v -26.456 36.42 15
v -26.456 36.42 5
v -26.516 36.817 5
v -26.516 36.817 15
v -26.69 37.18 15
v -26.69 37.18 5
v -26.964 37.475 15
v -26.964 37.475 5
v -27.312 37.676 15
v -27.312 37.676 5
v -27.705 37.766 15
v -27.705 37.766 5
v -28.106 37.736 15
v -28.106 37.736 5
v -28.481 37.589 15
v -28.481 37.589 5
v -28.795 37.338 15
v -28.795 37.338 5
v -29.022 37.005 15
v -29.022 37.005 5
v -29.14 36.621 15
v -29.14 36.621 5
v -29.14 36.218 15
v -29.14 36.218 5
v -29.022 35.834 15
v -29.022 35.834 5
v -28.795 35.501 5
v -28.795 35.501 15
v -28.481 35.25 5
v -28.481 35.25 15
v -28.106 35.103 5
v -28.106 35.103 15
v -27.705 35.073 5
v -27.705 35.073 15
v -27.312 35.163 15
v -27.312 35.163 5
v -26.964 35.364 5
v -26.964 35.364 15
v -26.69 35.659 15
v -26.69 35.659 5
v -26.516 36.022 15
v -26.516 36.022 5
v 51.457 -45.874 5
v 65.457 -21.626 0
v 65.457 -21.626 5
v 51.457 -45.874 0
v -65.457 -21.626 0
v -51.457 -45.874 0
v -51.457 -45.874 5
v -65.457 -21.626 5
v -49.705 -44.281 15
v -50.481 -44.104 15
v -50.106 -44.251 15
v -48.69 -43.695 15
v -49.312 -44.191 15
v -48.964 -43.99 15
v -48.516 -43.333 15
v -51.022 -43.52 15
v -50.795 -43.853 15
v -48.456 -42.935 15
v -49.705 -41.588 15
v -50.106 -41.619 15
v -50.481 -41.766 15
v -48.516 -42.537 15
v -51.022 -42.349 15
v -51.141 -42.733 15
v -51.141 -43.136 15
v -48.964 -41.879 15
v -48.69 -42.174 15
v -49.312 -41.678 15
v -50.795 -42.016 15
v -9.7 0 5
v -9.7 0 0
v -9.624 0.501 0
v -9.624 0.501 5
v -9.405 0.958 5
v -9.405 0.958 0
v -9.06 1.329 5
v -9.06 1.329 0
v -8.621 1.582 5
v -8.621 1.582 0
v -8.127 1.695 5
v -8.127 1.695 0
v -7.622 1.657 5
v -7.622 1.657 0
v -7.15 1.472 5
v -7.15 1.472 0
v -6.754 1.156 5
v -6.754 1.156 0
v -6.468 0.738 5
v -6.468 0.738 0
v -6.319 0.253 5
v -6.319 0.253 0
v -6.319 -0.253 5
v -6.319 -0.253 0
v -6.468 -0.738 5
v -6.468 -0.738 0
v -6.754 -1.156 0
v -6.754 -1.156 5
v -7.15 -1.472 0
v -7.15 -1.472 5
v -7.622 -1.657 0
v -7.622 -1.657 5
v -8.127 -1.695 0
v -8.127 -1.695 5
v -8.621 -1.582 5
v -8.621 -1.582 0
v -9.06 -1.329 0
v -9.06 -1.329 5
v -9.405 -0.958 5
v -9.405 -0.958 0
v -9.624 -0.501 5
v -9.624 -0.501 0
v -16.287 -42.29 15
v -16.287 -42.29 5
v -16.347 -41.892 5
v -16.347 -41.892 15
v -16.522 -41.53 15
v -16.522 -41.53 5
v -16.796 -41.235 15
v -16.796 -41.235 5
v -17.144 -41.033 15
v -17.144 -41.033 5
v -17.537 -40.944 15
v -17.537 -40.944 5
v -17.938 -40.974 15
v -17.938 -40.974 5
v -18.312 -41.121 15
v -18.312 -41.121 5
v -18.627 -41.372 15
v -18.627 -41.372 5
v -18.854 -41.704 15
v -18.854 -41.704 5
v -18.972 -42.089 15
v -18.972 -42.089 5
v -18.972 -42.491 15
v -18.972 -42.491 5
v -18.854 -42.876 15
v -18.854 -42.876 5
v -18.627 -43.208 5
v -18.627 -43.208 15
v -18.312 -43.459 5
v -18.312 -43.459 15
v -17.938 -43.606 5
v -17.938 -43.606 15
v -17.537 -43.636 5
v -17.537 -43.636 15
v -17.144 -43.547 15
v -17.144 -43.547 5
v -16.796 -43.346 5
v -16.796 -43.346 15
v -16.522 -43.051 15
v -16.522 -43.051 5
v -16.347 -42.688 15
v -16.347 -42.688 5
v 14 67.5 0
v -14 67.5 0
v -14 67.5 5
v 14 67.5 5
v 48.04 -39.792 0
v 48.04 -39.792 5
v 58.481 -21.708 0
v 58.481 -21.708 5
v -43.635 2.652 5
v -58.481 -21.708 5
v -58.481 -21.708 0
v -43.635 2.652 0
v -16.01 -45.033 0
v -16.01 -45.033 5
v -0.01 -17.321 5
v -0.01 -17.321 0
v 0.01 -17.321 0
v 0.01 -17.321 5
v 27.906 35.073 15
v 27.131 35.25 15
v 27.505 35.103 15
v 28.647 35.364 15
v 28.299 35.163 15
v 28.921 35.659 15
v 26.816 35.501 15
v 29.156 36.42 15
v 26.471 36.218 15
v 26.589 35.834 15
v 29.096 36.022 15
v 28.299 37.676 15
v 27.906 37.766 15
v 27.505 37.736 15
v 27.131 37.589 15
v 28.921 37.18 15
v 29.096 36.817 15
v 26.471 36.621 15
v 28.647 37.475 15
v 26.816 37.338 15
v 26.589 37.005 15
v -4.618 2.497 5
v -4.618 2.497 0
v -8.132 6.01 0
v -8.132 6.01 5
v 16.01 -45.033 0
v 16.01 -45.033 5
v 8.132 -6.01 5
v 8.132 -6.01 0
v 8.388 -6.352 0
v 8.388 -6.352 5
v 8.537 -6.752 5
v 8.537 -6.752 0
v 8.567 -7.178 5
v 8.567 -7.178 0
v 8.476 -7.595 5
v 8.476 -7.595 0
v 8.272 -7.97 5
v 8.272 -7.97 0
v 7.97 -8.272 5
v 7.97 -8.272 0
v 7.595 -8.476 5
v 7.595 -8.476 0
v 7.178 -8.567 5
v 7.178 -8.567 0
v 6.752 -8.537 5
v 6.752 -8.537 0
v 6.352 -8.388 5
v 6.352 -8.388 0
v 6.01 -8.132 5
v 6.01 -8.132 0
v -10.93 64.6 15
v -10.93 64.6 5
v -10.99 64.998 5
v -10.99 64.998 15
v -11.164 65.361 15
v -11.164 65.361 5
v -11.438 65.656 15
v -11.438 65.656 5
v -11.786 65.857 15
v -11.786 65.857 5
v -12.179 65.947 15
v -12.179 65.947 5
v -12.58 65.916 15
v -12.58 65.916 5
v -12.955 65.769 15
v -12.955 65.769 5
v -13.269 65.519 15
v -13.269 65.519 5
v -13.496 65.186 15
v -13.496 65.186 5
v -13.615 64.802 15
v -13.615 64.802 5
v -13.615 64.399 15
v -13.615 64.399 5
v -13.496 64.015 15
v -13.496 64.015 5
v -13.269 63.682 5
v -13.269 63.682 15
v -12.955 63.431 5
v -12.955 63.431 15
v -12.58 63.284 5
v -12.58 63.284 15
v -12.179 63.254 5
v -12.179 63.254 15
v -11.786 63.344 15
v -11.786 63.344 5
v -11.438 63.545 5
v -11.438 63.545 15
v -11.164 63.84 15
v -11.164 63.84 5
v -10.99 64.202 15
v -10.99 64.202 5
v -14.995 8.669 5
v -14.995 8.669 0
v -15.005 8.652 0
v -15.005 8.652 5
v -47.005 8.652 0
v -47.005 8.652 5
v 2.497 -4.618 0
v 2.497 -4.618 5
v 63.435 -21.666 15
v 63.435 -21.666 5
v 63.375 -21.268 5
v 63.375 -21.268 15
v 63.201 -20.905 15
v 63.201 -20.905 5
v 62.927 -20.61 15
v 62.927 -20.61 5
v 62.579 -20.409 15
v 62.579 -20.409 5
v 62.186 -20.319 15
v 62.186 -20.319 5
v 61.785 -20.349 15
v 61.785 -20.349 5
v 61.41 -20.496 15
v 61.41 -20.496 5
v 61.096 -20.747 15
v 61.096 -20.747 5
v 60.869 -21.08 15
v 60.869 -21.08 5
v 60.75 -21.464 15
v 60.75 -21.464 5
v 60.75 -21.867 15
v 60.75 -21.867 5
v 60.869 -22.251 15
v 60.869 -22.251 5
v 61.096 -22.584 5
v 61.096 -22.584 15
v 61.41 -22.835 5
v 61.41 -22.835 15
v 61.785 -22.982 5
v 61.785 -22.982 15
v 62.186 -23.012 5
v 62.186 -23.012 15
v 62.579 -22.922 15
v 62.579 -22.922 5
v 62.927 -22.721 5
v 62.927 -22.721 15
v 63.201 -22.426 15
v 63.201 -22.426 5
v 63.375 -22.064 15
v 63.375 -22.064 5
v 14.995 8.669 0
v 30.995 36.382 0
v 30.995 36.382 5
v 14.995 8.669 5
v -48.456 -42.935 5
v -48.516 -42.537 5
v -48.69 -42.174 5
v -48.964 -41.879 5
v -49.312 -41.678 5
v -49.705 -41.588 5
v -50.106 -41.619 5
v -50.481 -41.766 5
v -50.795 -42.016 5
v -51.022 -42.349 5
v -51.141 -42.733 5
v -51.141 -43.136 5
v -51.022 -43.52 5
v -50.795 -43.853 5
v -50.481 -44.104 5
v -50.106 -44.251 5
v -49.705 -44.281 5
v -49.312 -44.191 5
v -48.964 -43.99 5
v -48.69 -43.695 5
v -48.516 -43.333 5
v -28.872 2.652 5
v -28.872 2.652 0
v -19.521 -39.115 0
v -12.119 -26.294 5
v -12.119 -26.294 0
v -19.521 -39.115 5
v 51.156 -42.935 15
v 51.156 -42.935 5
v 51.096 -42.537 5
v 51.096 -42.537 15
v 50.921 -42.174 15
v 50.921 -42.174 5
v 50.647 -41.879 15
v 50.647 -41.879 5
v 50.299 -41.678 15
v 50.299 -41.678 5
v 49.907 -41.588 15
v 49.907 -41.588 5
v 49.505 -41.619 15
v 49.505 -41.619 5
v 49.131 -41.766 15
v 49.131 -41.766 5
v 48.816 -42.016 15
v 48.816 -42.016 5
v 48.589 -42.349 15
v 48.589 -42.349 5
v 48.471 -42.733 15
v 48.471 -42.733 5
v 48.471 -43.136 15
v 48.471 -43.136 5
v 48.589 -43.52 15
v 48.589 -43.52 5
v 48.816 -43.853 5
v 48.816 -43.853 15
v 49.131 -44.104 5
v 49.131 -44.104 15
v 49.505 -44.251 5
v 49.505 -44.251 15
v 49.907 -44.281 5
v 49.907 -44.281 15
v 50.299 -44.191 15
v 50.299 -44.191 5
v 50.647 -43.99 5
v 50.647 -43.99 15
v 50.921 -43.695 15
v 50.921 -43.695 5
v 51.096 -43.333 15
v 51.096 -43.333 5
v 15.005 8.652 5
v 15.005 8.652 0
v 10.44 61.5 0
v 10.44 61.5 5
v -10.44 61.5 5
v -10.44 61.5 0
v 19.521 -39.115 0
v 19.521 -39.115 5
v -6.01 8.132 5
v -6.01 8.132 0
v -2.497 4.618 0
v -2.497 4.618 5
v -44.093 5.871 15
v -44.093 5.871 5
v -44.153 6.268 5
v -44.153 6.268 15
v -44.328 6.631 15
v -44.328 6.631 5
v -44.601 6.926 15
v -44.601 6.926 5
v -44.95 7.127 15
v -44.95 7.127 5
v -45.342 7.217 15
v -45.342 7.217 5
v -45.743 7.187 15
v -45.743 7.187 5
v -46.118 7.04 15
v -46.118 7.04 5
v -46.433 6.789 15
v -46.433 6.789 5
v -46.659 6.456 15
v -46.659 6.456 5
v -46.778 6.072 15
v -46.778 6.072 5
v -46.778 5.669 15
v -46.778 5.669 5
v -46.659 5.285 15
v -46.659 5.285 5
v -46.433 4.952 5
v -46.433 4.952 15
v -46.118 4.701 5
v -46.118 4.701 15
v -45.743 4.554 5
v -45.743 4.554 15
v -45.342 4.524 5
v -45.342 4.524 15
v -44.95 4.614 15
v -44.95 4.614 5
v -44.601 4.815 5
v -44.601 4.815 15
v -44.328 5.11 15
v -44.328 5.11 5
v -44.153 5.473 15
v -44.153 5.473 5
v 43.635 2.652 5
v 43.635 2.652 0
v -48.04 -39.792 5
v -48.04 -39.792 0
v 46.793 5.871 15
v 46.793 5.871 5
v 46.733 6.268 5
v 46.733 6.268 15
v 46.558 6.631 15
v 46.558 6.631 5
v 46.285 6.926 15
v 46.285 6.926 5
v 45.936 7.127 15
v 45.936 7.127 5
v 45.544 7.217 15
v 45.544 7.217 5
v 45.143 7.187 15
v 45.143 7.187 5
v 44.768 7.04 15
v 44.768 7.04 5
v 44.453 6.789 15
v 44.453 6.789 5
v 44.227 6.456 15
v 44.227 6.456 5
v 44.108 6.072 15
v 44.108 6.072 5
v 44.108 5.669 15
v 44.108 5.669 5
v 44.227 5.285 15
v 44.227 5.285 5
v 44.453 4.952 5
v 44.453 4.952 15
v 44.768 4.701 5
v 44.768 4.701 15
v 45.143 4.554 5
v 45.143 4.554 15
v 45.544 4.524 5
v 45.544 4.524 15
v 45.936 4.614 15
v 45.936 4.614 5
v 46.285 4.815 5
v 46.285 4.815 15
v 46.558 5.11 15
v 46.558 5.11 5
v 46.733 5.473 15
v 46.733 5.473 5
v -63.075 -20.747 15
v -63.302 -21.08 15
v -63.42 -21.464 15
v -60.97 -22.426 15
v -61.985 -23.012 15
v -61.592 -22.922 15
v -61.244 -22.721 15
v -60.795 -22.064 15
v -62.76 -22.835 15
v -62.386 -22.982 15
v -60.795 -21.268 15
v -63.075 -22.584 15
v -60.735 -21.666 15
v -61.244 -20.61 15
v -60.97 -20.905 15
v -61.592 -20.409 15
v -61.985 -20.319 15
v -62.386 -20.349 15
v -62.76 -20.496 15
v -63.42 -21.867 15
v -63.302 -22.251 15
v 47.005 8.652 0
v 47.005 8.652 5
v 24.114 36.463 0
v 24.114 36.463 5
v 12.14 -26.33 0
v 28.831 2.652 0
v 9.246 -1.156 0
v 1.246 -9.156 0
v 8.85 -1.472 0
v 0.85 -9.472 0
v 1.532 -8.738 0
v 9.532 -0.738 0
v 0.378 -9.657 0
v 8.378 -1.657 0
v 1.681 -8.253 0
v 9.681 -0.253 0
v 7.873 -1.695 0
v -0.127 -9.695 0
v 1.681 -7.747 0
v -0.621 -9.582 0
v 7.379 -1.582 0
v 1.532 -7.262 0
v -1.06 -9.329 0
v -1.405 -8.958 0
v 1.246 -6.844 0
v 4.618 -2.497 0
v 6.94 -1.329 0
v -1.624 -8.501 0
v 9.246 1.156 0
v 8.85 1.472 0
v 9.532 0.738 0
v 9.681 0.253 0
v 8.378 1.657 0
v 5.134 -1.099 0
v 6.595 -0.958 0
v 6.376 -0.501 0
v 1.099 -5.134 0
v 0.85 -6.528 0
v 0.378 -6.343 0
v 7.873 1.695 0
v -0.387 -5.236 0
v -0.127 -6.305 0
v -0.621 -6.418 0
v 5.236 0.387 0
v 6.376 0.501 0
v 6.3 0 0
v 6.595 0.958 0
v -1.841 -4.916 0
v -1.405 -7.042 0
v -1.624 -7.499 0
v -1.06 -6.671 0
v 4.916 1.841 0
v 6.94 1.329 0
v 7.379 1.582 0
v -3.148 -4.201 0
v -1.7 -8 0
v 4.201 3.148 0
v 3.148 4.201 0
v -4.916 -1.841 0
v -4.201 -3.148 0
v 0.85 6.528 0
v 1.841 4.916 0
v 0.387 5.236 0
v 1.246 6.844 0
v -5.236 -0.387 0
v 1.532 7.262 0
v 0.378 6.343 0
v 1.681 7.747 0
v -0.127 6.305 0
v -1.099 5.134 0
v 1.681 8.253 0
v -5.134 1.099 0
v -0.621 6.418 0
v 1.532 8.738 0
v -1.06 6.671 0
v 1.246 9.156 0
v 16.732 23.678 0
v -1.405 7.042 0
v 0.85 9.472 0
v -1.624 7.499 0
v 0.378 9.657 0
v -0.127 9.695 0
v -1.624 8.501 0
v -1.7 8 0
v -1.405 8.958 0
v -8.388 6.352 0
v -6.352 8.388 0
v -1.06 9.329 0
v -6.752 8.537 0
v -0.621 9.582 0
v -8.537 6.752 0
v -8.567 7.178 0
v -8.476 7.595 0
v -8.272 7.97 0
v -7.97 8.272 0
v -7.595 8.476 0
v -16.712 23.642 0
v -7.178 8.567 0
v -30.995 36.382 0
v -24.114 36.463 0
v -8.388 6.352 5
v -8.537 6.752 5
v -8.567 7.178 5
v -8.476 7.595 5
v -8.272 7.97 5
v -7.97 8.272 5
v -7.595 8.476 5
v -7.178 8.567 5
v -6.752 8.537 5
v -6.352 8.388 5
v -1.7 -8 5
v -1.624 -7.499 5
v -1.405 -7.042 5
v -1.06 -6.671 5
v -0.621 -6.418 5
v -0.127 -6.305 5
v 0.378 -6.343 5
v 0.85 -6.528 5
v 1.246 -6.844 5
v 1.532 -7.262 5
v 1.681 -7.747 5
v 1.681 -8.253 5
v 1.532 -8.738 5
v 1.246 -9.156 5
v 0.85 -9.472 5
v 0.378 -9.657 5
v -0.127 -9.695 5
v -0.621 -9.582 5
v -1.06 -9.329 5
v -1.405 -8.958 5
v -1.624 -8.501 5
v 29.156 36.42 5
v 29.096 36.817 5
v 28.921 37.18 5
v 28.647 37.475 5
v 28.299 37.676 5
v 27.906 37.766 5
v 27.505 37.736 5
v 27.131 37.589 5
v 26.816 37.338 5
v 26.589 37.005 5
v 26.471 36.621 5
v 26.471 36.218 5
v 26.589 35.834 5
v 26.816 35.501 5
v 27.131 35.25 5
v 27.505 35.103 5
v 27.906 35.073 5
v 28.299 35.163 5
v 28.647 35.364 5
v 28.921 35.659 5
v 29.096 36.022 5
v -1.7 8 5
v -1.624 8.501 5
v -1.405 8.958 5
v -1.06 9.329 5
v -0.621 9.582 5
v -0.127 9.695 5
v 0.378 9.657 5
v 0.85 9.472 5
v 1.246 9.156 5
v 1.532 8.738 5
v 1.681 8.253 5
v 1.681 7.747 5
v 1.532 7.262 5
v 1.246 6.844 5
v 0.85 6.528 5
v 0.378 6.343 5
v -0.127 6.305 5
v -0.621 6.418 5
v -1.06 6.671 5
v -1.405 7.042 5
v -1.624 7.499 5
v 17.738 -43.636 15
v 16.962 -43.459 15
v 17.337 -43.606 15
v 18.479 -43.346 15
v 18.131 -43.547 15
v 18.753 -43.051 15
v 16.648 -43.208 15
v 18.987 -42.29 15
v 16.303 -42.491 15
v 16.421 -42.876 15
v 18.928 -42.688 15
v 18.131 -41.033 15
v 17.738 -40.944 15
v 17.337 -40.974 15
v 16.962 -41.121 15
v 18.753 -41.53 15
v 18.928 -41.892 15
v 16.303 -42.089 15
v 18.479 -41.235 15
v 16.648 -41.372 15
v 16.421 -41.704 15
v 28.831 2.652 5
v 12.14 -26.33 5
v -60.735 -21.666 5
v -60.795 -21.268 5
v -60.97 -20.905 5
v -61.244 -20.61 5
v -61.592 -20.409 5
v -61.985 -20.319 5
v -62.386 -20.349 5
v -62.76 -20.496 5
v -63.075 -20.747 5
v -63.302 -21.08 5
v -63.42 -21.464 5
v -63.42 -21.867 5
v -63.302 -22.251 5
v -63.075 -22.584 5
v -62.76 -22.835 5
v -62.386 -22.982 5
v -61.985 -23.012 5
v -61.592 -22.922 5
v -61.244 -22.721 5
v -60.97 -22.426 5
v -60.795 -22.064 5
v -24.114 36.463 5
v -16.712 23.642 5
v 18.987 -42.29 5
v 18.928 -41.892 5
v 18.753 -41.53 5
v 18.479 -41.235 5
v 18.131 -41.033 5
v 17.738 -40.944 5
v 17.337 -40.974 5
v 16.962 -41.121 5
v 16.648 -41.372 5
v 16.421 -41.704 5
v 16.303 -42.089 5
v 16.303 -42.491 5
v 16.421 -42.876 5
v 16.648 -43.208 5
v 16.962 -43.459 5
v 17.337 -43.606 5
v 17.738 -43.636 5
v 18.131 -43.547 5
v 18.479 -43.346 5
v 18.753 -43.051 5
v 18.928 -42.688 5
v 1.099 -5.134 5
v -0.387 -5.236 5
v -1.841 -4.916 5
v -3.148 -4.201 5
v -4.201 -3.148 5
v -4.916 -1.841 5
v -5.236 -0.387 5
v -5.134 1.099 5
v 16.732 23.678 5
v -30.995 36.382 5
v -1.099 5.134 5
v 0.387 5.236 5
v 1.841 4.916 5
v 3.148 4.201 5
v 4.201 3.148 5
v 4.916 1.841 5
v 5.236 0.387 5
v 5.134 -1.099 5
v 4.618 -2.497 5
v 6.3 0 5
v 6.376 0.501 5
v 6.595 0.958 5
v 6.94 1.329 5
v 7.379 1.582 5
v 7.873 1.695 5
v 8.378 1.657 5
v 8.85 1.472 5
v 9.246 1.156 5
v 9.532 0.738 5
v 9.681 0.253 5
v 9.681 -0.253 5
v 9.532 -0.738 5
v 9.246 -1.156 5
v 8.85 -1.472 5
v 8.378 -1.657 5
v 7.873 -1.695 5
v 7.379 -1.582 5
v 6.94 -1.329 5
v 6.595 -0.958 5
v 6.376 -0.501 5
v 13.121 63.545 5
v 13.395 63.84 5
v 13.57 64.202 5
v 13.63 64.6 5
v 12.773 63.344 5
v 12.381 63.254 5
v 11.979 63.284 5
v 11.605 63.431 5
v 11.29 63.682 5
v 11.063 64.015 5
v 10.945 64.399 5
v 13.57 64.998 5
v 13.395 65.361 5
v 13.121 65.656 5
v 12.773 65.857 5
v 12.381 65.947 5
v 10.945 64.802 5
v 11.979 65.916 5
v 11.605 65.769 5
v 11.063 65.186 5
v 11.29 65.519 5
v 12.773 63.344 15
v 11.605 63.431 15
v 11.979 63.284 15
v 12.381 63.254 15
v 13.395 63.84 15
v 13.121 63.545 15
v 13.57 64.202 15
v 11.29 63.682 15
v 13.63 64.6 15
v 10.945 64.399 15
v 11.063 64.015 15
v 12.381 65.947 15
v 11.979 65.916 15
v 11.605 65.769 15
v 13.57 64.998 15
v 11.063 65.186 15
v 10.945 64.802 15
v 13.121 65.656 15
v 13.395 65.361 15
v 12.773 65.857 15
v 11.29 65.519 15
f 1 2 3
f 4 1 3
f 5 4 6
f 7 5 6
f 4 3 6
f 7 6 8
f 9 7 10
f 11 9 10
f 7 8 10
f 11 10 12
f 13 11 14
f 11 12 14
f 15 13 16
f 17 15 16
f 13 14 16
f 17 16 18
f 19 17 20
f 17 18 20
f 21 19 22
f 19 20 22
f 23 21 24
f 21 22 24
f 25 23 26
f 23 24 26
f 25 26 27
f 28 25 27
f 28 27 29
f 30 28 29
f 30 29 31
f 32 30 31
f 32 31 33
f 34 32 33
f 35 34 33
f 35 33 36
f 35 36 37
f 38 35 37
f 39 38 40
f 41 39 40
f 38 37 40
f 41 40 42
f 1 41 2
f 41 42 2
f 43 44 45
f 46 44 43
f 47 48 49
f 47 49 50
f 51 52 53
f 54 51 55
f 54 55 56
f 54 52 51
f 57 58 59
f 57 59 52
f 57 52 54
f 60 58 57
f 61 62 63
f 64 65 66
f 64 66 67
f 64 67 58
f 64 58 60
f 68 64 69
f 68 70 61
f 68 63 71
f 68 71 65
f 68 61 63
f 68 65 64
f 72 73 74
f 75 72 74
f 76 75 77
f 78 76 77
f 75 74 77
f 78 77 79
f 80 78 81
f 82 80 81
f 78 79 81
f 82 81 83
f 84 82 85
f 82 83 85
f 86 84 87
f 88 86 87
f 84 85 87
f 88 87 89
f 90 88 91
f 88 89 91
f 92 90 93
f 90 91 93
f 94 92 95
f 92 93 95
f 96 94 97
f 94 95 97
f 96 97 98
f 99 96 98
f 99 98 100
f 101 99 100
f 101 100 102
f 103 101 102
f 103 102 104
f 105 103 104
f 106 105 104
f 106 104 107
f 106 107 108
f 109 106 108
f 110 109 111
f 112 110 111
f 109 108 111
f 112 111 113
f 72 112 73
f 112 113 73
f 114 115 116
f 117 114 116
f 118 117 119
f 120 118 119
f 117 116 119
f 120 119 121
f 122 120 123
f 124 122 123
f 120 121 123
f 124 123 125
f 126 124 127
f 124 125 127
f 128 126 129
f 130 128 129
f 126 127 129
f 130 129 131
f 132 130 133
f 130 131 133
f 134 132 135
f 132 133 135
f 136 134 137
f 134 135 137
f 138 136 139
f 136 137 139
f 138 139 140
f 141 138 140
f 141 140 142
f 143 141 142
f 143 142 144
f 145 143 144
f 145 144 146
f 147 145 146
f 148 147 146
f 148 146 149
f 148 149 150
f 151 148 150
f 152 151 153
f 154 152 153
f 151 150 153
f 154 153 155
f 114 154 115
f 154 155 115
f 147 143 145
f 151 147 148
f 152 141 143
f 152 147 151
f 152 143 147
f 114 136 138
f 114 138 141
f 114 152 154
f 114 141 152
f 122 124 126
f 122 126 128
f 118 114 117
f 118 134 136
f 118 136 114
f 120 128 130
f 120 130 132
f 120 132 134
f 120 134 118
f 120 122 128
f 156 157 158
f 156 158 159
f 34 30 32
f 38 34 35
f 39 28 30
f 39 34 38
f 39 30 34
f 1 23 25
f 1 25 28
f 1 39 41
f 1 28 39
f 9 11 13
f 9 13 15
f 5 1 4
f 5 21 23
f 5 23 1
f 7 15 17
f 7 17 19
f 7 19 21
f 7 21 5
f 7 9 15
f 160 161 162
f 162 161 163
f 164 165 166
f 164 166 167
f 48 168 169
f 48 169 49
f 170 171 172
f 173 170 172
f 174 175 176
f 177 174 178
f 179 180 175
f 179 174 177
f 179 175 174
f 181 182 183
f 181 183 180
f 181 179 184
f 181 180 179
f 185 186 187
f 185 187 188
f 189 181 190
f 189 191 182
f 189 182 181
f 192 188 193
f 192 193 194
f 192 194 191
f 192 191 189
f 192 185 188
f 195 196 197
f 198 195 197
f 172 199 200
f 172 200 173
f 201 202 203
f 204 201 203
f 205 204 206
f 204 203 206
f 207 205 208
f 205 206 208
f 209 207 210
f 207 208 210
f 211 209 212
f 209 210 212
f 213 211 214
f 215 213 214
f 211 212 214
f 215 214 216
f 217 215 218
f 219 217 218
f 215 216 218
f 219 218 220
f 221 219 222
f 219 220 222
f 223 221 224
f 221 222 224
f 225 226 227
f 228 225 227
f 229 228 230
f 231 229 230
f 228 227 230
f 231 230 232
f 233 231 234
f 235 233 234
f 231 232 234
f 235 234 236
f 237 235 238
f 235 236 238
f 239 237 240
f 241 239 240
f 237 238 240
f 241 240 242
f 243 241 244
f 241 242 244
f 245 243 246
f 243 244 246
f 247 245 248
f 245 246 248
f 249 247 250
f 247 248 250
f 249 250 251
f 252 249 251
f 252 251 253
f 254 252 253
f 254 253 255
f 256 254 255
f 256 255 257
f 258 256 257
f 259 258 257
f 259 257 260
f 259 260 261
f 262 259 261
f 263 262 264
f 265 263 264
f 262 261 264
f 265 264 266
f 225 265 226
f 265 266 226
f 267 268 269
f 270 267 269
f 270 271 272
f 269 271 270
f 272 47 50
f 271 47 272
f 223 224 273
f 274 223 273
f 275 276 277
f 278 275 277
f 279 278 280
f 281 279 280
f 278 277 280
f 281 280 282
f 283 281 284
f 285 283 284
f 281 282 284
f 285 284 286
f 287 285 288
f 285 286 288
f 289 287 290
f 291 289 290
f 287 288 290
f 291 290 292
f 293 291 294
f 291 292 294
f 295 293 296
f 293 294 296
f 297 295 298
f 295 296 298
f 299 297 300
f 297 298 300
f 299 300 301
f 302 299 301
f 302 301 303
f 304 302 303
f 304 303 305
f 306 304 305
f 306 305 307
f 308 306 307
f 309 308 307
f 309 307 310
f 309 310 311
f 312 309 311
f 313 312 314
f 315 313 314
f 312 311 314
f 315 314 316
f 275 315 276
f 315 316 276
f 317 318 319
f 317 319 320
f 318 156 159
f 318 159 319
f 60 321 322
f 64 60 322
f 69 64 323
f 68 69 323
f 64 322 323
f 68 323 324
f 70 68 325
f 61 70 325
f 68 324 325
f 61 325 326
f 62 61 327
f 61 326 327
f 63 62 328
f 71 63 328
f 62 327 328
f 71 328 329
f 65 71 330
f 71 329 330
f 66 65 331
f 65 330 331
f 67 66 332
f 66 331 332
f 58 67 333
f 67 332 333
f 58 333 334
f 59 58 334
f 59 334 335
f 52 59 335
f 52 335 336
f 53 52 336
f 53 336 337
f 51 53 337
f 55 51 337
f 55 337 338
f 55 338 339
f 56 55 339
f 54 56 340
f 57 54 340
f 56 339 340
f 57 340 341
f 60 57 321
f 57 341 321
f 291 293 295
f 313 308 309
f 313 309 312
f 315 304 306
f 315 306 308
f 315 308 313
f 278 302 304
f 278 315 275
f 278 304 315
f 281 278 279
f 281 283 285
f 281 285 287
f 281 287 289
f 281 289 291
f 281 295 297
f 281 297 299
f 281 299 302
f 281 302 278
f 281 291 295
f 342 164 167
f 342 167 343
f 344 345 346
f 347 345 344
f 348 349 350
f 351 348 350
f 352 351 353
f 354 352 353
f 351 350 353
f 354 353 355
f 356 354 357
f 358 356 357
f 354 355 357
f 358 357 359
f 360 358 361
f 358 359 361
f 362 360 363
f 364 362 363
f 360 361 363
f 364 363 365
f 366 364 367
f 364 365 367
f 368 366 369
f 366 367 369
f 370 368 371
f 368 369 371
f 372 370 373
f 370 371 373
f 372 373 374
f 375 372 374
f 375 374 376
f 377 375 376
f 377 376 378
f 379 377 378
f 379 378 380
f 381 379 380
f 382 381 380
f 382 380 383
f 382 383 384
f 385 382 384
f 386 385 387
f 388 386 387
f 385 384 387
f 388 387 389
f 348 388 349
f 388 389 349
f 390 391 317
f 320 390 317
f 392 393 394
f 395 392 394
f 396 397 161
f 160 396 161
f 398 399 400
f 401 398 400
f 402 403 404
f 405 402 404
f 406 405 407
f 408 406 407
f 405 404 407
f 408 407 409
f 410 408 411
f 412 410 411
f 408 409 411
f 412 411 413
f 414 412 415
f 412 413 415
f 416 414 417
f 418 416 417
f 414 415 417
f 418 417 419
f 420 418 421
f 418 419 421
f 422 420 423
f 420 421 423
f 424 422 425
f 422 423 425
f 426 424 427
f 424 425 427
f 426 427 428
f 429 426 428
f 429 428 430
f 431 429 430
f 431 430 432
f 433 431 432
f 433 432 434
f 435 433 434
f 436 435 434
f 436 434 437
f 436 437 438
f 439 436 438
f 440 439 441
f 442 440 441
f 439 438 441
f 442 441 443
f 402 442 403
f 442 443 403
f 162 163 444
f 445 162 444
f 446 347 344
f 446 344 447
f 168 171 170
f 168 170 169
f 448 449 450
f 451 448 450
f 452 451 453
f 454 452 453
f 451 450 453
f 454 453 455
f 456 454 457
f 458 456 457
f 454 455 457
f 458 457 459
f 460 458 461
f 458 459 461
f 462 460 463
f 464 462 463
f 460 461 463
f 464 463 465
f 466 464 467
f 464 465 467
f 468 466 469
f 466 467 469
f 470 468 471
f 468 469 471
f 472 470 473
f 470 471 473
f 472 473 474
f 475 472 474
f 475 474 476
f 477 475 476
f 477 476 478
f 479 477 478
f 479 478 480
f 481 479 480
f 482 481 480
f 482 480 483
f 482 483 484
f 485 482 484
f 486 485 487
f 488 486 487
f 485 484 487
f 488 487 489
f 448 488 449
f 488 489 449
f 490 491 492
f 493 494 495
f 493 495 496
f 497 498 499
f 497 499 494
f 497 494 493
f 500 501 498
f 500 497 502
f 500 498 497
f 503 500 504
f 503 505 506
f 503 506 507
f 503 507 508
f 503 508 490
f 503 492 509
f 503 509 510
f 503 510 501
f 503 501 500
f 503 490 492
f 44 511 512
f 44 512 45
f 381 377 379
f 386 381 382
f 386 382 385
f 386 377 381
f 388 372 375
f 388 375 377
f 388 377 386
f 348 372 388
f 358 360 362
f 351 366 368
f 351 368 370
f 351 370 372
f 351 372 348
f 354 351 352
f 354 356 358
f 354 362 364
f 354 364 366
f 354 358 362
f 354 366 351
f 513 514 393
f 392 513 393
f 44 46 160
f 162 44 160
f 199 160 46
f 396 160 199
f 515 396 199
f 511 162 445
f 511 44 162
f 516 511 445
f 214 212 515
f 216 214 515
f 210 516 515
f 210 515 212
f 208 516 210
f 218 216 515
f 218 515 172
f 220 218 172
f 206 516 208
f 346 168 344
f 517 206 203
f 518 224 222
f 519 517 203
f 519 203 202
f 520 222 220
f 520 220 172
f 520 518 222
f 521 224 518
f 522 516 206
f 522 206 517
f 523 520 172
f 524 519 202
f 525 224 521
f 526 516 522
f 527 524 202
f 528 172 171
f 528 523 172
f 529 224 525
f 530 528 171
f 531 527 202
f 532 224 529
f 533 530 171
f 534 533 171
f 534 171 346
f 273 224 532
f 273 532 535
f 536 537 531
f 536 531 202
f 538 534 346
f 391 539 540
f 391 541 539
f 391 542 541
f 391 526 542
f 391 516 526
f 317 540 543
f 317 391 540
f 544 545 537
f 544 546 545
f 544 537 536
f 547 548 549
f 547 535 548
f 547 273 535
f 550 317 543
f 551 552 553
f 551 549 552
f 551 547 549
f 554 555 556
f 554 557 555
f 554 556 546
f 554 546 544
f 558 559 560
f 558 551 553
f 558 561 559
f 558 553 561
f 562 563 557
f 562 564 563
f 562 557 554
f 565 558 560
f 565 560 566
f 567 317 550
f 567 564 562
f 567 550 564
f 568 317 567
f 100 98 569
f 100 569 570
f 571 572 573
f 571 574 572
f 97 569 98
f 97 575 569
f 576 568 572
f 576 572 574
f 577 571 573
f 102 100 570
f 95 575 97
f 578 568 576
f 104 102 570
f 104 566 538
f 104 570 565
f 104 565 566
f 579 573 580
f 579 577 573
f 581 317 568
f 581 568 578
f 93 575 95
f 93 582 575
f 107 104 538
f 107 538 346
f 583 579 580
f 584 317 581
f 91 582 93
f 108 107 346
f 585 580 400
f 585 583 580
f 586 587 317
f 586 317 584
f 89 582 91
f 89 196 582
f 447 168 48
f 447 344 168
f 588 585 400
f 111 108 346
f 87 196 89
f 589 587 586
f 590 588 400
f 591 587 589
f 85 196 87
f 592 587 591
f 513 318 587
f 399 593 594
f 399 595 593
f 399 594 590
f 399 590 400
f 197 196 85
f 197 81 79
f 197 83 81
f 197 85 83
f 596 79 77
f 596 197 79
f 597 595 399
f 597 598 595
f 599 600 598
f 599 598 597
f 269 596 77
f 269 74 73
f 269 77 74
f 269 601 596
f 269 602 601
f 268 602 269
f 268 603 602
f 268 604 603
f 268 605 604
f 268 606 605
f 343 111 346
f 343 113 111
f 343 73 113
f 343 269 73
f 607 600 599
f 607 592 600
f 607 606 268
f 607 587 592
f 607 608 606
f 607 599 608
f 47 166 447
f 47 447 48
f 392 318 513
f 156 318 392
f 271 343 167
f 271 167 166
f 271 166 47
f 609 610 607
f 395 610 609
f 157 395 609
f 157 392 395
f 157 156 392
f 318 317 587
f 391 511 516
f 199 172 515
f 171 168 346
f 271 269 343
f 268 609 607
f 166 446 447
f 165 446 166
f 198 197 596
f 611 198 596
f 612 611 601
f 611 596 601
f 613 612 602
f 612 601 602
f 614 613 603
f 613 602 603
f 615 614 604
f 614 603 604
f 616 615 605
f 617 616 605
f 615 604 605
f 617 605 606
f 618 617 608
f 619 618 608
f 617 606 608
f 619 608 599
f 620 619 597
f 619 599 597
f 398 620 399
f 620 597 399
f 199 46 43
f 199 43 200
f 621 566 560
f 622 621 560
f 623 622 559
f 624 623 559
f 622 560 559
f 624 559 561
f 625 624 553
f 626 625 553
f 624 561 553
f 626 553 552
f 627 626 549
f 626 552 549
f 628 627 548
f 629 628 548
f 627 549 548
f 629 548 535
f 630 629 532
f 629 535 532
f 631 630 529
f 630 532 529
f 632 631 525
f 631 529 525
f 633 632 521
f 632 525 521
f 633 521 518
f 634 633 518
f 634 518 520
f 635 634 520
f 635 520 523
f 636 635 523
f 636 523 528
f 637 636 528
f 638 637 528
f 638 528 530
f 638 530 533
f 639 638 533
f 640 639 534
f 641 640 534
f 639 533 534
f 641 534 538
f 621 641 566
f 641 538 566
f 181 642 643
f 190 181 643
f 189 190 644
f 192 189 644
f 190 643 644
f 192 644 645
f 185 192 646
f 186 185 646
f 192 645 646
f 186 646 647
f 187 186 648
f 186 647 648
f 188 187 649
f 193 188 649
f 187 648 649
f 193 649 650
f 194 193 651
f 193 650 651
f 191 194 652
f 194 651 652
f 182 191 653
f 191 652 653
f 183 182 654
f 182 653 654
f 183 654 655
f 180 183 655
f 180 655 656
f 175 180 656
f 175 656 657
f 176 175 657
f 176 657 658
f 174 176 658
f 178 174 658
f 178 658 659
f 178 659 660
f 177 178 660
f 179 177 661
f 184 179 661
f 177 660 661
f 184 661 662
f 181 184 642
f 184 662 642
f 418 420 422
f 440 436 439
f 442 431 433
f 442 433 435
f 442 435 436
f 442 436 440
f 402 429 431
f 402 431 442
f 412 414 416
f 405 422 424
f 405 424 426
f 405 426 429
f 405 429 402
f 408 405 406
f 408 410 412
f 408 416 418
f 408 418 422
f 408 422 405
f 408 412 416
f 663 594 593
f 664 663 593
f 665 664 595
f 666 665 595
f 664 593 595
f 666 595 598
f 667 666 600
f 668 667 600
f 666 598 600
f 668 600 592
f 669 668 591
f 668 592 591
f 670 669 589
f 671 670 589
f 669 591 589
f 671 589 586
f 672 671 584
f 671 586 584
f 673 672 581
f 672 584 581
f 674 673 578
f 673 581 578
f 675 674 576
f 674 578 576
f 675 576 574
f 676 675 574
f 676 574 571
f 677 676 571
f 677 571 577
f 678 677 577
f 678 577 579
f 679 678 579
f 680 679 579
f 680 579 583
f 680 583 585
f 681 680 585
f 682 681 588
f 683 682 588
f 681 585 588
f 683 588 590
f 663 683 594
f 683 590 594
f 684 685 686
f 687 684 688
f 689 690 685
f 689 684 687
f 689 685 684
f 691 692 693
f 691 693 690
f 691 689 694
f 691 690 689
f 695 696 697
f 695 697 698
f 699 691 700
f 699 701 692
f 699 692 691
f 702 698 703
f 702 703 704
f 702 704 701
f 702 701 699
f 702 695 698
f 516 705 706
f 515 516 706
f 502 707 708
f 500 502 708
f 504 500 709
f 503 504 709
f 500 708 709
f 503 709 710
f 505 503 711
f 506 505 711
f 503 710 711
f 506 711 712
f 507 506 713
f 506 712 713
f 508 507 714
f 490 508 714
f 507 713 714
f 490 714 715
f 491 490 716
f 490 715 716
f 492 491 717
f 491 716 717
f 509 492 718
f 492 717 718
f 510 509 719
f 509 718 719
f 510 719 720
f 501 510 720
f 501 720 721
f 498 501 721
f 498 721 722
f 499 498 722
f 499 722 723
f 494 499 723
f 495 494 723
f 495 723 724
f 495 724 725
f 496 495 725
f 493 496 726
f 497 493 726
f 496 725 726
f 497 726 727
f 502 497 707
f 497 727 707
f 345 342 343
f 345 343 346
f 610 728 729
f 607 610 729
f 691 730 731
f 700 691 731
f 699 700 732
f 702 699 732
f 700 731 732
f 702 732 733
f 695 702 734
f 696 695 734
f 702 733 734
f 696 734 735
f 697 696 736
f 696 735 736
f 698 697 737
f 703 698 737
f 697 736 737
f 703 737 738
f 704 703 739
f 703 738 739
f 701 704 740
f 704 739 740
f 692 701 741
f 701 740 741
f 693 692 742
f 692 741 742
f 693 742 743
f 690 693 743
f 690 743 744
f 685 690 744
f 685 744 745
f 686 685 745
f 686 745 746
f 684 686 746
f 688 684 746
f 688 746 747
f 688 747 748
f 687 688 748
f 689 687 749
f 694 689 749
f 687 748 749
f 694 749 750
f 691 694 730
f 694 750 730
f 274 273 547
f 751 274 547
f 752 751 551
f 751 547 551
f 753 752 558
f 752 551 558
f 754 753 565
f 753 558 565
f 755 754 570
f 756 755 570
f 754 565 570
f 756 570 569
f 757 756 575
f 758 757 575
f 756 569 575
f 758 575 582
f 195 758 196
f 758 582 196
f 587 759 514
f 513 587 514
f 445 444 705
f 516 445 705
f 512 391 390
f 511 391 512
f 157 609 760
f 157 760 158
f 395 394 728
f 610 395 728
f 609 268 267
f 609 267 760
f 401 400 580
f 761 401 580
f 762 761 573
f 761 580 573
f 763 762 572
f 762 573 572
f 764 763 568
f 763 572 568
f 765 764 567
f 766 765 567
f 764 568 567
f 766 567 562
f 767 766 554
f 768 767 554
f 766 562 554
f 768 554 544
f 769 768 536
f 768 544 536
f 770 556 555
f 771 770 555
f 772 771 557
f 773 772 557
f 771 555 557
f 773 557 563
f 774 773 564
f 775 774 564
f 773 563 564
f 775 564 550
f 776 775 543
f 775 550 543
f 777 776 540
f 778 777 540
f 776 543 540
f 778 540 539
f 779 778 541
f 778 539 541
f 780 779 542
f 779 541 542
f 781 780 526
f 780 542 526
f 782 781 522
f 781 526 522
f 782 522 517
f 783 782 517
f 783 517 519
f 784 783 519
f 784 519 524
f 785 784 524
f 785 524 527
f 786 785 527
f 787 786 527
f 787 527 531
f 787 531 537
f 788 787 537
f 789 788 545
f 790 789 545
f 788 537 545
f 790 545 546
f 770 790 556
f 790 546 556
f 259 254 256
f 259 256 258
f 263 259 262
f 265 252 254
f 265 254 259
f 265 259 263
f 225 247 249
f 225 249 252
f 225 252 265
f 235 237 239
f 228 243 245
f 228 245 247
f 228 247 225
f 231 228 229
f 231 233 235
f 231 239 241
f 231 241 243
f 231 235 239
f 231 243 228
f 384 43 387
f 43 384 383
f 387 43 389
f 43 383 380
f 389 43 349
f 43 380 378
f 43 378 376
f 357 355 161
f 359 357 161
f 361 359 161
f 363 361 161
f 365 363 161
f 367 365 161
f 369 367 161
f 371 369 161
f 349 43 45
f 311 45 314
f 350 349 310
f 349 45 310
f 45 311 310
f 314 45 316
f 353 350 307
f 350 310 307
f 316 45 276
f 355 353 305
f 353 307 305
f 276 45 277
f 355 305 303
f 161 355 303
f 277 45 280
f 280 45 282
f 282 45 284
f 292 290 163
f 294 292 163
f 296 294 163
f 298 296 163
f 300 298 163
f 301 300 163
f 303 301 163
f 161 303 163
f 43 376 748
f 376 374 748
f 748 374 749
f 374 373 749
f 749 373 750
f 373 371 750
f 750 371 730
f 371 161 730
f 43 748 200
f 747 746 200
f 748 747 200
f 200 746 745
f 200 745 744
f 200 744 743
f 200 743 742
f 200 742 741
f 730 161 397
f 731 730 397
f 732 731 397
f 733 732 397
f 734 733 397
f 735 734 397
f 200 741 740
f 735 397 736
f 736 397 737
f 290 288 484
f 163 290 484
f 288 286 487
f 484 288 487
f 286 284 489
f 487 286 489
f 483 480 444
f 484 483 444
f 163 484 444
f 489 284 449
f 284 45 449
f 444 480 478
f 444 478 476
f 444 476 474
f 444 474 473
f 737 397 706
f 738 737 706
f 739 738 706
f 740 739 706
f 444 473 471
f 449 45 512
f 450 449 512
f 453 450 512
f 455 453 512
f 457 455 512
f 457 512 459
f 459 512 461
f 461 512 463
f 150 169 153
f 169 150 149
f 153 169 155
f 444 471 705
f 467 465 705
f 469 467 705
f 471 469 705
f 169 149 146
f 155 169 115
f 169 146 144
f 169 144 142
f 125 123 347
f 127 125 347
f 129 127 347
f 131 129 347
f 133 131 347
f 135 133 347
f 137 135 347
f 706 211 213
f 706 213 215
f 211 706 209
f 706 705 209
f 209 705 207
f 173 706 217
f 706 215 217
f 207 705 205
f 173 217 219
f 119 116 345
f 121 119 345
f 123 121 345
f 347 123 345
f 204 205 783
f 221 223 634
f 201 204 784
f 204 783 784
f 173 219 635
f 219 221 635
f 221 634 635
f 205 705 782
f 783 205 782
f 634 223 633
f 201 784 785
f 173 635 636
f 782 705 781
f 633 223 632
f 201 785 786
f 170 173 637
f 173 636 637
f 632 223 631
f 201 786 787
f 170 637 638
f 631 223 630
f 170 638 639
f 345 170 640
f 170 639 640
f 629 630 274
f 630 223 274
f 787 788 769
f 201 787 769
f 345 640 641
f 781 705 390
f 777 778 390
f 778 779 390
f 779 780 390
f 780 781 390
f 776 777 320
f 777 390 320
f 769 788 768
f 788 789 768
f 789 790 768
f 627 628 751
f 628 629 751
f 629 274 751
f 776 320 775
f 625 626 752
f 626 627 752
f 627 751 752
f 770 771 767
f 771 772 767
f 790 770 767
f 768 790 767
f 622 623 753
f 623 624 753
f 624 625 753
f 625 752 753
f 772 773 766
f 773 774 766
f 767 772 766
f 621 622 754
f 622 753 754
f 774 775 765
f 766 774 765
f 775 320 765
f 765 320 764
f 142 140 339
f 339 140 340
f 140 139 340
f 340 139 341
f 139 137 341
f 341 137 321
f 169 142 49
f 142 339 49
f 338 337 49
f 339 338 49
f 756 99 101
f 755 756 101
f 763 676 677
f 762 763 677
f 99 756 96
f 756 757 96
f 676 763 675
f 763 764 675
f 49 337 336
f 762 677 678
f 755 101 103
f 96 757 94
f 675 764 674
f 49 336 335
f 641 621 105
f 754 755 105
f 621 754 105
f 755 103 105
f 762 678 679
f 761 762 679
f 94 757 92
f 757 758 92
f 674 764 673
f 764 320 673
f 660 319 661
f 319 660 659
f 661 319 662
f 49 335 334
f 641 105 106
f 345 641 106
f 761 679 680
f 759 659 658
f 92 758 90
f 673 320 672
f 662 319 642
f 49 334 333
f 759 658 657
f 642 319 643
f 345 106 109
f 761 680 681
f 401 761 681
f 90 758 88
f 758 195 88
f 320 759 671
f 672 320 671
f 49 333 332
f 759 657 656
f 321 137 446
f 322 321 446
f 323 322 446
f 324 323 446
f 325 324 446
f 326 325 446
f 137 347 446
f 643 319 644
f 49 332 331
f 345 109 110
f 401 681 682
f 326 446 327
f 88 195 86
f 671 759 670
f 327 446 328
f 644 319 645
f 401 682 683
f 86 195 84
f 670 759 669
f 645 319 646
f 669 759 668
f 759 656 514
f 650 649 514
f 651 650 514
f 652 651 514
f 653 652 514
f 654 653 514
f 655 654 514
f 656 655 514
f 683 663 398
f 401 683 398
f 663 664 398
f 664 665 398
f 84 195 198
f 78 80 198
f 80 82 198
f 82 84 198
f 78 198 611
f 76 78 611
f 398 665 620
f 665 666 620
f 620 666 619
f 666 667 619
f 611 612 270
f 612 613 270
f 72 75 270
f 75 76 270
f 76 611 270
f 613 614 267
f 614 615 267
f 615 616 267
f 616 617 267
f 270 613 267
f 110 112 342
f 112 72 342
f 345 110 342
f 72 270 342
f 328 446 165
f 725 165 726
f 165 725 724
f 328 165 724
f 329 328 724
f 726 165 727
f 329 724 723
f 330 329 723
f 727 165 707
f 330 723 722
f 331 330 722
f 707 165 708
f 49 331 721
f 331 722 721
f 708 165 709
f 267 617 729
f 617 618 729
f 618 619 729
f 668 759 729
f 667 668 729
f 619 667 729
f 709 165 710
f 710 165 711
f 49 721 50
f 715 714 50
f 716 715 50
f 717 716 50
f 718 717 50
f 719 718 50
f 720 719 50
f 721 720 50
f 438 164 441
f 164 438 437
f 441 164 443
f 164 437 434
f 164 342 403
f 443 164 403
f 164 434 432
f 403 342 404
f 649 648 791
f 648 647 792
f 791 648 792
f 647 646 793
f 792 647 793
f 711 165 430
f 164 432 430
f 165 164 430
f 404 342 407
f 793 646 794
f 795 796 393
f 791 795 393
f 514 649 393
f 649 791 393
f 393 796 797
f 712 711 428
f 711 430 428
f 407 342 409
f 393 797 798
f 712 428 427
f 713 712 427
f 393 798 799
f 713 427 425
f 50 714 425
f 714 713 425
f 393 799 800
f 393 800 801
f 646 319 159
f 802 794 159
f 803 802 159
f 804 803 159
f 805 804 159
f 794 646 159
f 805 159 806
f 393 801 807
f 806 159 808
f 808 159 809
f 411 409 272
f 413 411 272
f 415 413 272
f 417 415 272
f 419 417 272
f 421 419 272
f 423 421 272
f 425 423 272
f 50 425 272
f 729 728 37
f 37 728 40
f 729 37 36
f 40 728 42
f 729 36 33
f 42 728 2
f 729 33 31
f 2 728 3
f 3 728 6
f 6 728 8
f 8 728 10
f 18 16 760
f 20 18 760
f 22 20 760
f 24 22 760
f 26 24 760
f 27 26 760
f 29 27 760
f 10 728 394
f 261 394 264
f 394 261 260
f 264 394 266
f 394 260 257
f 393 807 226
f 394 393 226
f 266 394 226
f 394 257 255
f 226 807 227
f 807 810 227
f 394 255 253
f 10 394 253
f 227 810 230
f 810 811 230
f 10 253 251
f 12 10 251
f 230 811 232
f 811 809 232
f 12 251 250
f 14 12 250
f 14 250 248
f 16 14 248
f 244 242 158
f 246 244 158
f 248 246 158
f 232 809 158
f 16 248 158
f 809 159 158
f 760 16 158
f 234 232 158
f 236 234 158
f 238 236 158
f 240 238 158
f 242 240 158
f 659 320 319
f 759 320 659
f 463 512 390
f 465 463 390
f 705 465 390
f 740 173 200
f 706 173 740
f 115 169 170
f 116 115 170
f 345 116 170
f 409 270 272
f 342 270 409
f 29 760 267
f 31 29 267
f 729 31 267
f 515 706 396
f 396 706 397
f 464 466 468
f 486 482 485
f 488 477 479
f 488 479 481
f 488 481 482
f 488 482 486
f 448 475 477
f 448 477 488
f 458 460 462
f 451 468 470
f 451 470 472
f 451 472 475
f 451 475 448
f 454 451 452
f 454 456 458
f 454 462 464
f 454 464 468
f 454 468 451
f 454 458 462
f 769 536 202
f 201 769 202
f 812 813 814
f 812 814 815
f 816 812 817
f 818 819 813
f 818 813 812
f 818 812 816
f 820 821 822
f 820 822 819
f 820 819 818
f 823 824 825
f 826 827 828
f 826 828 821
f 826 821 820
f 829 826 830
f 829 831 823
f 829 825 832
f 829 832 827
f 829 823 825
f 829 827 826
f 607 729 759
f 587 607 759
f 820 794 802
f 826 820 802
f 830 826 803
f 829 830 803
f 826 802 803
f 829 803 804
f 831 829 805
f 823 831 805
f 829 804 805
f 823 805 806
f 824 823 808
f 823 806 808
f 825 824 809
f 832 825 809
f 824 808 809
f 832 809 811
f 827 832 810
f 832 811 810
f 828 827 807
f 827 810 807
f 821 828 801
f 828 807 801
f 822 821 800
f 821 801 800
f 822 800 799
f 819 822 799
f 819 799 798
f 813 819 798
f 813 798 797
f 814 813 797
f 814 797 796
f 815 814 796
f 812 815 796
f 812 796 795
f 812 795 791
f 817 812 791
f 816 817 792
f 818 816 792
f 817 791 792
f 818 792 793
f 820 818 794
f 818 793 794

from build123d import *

# Parameters (mm, degrees)
BOSS_EXTRUDE1_DEPTH = 5
CUT_EXTRUDE1_DEPTH  = 95.158544522
CUT_EXTRUDE2_DEPTH  = 5
SKETCH5_R           = 1.35
BOSS_EXTRUDE2_DEPTH = 10
SKETCH6_R           = 1.7
CUT_EXTRUDE3_DEPTH  = 5


with BuildPart() as part:
    # Sketch1 → Boss-Extrude1 (new body)
    with BuildSketch(Plane.XY):
        Polygon((-30.995, 36.381727213), (-14, 67.5), (14, 67.5), (30.995, 36.381727213), (14.995, 8.668914292), (15, 8.660254038), (15.005, 8.651593784), (47.005, 8.651593784), (65.456714755, -21.625644347), (51.456714755, -45.874355653), (16.01, -45.033320997), (0.01, -17.320508076), (0, -17.320508076), (-0.01, -17.320508076), (-16.01, -45.033320997), (-51.456714755, -45.874355653), (-65.456714755, -21.625644347), (-47.005, 8.651593784), (-15.005, 8.651593784), (-15, 8.660254038), (-14.995, 8.668914292), align=None)
    extrude(amount=BOSS_EXTRUDE1_DEPTH)

    # Sketch2 → Cut-Extrude1 (cut, through all)
    with BuildSketch(Plane.XY.offset(5)):
        Polygon((-28.872149716, 2.651593784), (-12.118974925, -26.293867874), (-19.521225678, -39.114942267), (-48.040387098, -39.791608731), (-58.480737567, -21.708391269), (-43.63514651, 2.651593784), align=None)
        Polygon((-24.113920832, 36.463348484), (-16.71167008, 23.64227409), (16.732422435, 23.678218224), (24.113920832, 36.463348484), (10.440350469, 61.5), (-10.440350469, 61.5), align=None)
        Polygon((43.63514651, 2.651593784), (28.830645005, 2.651593784), (12.139727281, -26.329812008), (19.521225678, -39.114942267), (48.040387098, -39.791608731), (58.480737567, -21.708391269), align=None)
    extrude(amount=-CUT_EXTRUDE1_DEPTH, mode=Mode.SUBTRACT)

    # Sketch3 → Cut-Extrude2 (cut)
    with BuildSketch(Plane(origin=(0, 0, 0), x_dir=(-1, 0, 0), z_dir=(0, 0, -1))):
        with BuildLine():
            Line((6.01040764, 8.131727984), (2.496902196, 4.618222539))
            ThreePointArc((2.496902196, 4.618222539), (-3.712310601, 3.712310601), (-4.618222539, -2.496902196))
            Line((-4.618222539, -2.496902196), (-8.131727984, -6.01040764))
            ThreePointArc((-8.131727984, -6.01040764), (-8.131727984, -8.131727984), (-6.01040764, -8.131727984))
            Line((-6.01040764, -8.131727984), (-2.496902196, -4.618222539))
            ThreePointArc((-2.496902196, -4.618222539), (3.712310601, -3.712310601), (4.618222539, 2.496902196))
            Line((4.618222539, 2.496902196), (8.131727984, 6.01040764))
            ThreePointArc((8.131727984, 6.01040764), (8.131727984, 8.131727984), (6.01040764, 8.131727984))
        make_face()
    extrude(amount=-CUT_EXTRUDE2_DEPTH, mode=Mode.SUBTRACT)

    # Sketch5 → Boss-Extrude2 (add)
    with BuildSketch(Plane.XY.offset(5)):
        with Locations((-45.443044798, 5.870544436)):
            Circle(SKETCH5_R)
        with Locations((-62.08538883, -21.665632507)):
            Circle(SKETCH5_R)
        with Locations((-49.805684066, -42.93470506)):
            Circle(SKETCH5_R)
        with Locations((-17.637483295, -42.290100822)):
            Circle(SKETCH5_R)
        with Locations((27.80556106, 36.419560852)):
            Circle(SKETCH5_R)
        with Locations((12.279704321, 64.600342034)):
            Circle(SKETCH5_R)
        with Locations((-12.279705207, 64.600342034)):
            Circle(SKETCH5_R)
        with Locations((-27.805561947, 36.419560852)):
            Circle(SKETCH5_R)
        with Locations((17.637482409, -42.290100822)):
            Circle(SKETCH5_R)
        with Locations((49.80568318, -42.93470506)):
            Circle(SKETCH5_R)
        with Locations((62.085387944, -21.665632507)):
            Circle(SKETCH5_R)
        with Locations((45.443043912, 5.870544436)):
            Circle(SKETCH5_R)
    extrude(amount=BOSS_EXTRUDE2_DEPTH)

    # Sketch6 → Cut-Extrude3 (cut)
    with BuildSketch(Plane(origin=(0, 0, 0), x_dir=(-1, 0, 0), z_dir=(0, 0, -1))):
        with Locations((-8, 0)):
            Circle(SKETCH6_R)
        with Locations((0, -8)):
            Circle(SKETCH6_R)
        with Locations((8, 0)):
            Circle(SKETCH6_R)
        with Locations((0, 8)):
            Circle(SKETCH6_R)
    extrude(amount=-CUT_EXTRUDE3_DEPTH, mode=Mode.SUBTRACT)


solid = part.part
